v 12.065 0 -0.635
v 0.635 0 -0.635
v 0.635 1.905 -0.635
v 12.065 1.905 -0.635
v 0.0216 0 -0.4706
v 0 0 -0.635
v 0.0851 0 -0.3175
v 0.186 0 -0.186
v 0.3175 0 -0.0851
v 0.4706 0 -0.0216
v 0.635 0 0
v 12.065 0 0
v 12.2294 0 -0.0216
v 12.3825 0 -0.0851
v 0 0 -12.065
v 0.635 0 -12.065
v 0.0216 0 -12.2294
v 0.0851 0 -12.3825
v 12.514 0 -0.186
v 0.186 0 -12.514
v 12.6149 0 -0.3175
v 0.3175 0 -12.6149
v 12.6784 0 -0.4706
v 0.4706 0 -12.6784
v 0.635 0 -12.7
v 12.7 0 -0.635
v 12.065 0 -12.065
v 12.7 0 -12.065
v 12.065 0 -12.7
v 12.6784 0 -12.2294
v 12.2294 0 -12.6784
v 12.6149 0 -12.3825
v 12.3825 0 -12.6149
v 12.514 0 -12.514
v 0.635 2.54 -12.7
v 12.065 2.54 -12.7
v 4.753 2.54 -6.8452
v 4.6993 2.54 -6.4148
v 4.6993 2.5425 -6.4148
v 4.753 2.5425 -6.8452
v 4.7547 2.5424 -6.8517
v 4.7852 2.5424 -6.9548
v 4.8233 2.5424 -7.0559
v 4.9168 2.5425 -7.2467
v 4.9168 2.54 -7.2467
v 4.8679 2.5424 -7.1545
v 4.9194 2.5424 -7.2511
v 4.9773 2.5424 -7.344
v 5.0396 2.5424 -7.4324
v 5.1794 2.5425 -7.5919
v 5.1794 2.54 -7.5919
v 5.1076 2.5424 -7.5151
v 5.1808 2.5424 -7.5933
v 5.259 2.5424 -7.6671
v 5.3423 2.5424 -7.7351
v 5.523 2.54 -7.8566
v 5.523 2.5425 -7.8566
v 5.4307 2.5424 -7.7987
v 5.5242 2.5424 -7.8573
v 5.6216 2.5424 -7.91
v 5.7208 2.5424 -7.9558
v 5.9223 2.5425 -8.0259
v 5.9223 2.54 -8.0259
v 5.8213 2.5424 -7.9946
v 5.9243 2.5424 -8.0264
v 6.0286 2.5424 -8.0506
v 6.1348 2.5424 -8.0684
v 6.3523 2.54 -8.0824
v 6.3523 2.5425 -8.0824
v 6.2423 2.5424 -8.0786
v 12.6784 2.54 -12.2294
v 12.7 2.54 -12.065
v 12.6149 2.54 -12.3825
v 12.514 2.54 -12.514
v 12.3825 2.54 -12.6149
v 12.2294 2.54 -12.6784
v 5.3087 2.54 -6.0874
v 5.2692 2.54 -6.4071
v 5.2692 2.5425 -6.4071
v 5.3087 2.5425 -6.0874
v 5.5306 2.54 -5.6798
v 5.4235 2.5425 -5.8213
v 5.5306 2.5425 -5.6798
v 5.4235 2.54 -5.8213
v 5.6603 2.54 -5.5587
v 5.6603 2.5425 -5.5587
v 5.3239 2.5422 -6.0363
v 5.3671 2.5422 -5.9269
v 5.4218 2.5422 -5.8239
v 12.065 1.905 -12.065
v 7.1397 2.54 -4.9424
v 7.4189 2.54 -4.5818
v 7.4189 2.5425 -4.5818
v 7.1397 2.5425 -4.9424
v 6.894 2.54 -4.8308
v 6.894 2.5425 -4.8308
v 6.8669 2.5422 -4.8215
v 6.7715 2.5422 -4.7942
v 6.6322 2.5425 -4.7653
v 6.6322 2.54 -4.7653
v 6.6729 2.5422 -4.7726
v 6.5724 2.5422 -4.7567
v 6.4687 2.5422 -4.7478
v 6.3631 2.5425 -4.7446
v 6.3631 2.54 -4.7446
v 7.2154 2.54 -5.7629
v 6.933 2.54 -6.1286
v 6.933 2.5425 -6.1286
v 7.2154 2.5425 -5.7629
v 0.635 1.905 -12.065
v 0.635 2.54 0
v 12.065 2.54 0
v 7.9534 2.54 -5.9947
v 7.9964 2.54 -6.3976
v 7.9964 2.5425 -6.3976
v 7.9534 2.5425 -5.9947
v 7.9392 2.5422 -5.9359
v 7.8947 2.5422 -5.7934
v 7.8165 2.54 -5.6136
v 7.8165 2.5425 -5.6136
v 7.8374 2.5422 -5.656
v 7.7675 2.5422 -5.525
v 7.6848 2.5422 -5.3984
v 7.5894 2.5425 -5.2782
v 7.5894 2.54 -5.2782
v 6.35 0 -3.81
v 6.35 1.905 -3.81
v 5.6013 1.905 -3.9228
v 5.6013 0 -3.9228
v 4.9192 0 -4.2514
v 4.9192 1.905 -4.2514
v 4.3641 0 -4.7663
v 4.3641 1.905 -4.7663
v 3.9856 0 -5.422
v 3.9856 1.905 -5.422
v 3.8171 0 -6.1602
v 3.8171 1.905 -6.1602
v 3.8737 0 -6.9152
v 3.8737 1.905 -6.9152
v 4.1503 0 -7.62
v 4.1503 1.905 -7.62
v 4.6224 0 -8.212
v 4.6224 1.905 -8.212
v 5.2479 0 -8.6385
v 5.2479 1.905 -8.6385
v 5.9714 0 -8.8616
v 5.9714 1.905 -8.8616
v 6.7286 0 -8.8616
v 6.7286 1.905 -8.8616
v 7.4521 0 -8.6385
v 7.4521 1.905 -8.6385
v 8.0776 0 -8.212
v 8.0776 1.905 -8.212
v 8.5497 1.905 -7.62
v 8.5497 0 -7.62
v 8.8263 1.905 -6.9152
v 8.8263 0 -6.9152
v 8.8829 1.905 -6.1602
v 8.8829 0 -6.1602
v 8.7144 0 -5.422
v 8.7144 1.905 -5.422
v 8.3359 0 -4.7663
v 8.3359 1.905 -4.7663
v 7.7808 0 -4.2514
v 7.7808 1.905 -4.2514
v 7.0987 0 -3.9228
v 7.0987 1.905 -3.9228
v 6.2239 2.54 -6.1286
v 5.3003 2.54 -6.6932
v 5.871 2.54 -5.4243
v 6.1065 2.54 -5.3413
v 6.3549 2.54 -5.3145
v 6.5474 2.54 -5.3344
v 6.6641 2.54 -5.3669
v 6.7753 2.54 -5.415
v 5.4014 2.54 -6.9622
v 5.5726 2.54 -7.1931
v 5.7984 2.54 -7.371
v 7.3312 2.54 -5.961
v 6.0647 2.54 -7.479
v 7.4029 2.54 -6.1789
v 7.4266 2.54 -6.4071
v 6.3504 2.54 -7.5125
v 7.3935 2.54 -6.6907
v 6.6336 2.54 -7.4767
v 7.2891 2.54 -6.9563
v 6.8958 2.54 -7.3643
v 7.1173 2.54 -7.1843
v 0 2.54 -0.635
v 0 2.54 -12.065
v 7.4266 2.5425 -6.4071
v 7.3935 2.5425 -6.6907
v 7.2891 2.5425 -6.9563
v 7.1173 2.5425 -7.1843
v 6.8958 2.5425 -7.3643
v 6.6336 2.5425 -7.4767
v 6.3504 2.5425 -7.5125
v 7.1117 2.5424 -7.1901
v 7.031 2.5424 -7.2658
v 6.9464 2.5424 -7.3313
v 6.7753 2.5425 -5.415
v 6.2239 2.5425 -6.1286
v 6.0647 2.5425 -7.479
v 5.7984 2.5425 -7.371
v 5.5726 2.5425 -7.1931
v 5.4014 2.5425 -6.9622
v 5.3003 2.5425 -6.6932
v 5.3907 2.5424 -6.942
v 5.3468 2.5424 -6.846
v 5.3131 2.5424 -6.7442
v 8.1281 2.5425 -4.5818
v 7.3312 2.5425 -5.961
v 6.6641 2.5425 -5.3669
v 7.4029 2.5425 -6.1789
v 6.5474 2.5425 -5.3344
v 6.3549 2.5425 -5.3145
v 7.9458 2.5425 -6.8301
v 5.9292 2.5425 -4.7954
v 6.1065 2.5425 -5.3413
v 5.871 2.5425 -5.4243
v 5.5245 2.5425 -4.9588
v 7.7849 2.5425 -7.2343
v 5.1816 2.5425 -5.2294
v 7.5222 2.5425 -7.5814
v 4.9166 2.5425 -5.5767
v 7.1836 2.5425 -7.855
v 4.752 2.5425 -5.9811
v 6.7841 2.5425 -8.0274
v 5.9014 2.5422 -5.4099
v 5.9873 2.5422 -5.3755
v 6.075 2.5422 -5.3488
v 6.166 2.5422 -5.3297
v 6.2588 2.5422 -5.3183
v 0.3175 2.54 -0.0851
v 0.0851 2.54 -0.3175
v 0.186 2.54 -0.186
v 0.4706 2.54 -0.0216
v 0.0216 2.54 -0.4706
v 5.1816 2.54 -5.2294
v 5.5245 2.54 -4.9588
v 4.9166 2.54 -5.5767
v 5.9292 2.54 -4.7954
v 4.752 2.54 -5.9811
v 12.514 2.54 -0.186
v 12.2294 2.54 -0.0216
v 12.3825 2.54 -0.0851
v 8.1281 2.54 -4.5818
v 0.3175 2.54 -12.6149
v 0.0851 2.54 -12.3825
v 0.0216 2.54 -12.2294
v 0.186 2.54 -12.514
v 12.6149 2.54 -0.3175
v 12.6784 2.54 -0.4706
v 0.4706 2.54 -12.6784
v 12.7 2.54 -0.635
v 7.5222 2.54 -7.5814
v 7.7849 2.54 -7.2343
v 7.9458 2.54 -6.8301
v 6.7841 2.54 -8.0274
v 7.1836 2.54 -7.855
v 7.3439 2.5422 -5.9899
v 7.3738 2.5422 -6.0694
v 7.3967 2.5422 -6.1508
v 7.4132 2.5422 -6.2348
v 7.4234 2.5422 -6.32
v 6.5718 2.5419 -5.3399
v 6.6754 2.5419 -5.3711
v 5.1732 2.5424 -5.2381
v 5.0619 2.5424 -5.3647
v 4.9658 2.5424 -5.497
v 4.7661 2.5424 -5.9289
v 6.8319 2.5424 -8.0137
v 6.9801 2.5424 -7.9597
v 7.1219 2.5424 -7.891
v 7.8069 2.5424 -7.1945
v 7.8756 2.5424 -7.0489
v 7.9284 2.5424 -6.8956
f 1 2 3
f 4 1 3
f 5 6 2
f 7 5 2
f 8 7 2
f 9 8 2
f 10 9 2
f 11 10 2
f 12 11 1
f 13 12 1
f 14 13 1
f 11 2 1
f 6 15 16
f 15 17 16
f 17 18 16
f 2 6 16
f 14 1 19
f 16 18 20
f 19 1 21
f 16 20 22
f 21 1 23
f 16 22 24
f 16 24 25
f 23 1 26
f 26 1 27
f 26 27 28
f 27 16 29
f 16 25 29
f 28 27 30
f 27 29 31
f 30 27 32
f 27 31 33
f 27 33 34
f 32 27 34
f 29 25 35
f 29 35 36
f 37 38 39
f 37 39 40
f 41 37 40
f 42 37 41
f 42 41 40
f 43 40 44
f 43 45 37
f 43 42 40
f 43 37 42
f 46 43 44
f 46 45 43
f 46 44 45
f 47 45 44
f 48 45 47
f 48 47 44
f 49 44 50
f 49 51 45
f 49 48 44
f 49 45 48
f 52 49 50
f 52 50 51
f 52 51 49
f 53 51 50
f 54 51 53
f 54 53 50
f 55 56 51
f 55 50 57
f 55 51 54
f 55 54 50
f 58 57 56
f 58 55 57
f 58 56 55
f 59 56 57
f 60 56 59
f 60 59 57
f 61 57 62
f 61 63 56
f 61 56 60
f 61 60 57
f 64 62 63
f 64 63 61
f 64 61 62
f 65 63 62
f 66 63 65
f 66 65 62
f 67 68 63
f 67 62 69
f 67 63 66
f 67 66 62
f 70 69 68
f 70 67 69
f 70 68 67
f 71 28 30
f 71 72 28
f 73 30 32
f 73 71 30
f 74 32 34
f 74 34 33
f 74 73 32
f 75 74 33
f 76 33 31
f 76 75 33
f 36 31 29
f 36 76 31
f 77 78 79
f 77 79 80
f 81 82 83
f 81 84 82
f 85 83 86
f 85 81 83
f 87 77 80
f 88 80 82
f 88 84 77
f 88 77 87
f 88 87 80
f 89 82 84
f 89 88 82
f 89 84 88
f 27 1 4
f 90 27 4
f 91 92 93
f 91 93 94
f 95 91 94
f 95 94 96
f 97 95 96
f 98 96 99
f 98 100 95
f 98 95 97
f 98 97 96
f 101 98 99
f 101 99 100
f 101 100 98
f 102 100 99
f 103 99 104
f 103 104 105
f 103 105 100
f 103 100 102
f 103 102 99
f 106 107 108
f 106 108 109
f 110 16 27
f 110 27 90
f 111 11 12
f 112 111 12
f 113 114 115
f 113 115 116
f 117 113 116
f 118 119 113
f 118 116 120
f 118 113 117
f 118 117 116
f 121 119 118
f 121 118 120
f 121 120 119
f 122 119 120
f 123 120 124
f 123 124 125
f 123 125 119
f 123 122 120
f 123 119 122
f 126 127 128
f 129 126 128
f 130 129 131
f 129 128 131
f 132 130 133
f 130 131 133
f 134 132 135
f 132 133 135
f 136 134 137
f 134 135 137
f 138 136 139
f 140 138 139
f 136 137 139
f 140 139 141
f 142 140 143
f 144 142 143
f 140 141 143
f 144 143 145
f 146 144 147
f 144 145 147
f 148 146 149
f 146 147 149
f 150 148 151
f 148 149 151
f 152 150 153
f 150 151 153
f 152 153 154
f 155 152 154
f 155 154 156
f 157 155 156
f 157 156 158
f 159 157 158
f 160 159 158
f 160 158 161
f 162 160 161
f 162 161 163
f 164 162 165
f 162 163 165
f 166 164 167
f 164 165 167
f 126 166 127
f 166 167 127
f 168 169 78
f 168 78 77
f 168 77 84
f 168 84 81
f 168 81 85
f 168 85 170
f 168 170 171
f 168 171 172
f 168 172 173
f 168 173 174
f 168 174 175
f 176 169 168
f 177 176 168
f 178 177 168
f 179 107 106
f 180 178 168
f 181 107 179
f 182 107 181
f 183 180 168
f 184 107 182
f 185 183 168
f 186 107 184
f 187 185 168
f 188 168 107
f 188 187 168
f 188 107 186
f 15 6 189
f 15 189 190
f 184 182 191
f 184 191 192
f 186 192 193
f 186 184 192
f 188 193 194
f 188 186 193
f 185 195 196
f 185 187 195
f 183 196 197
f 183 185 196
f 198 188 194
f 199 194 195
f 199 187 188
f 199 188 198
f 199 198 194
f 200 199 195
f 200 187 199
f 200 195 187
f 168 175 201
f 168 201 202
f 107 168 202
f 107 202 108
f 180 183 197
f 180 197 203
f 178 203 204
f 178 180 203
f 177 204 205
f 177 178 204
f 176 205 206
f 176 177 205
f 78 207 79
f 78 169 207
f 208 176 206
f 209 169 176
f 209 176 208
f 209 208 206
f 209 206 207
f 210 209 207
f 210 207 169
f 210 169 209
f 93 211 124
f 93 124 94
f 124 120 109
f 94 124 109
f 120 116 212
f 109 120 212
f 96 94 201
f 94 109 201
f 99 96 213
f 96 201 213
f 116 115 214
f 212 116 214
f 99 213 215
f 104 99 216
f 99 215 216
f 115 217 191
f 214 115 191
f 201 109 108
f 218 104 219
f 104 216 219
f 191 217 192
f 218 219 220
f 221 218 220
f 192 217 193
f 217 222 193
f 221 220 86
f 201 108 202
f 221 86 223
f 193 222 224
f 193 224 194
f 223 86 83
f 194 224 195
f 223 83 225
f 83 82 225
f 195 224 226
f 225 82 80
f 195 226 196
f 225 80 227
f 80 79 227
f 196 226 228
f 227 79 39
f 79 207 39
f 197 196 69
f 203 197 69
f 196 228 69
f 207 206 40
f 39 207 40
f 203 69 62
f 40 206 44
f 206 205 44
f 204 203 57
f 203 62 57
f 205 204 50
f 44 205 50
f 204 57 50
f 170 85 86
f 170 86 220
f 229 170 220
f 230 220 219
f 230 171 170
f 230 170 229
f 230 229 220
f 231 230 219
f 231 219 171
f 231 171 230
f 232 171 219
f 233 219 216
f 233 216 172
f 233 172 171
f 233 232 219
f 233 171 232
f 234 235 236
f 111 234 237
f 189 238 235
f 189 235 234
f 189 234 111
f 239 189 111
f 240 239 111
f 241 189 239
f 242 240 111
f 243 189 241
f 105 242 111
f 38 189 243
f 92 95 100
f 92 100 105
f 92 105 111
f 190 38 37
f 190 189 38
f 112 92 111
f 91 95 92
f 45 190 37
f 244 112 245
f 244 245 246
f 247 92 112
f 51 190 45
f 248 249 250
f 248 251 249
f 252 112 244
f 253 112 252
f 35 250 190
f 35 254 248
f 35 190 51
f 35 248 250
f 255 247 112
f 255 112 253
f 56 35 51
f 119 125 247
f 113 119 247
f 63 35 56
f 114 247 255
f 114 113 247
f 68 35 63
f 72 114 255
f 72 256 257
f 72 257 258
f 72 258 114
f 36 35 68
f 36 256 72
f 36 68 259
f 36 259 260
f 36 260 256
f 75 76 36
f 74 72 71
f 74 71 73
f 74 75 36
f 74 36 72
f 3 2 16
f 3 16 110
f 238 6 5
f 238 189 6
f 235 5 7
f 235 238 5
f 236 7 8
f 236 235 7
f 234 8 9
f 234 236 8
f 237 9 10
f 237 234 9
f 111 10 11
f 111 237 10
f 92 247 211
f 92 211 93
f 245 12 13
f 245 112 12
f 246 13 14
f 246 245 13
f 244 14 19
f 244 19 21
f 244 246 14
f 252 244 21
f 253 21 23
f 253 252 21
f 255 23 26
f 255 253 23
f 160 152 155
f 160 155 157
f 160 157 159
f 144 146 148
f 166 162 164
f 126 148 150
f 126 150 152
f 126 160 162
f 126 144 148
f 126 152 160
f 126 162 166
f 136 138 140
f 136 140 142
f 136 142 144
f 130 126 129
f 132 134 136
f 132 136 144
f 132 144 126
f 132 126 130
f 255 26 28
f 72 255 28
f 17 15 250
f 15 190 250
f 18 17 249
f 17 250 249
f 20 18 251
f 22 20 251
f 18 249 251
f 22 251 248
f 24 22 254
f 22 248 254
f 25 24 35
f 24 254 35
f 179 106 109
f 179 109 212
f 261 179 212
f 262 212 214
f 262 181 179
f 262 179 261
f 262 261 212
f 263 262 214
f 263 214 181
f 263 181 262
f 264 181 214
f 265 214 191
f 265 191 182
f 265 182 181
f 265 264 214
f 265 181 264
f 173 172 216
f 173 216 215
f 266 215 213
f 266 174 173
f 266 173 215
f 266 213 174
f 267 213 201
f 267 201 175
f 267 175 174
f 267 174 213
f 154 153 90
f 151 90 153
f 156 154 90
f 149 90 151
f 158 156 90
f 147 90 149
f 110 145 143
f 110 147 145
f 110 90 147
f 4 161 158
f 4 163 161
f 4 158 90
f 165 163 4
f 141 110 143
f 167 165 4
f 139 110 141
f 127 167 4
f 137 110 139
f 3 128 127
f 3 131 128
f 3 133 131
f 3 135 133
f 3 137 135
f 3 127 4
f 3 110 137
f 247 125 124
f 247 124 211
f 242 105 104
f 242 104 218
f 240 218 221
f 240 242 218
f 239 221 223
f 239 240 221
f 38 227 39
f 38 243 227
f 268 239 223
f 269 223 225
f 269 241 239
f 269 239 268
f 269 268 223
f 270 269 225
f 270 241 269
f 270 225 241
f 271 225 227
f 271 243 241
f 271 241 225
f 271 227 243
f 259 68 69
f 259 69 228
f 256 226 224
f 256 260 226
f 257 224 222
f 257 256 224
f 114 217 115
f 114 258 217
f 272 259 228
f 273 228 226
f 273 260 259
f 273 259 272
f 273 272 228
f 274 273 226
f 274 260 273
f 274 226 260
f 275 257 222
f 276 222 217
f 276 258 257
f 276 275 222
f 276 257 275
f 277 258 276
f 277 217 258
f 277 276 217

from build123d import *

# Parameters (mm, degrees)
SKETCH1_W           = 12.7
SKETCH1_H           = 12.7
BOSS_EXTRUDE1_DEPTH = 2.54
FILLET1_R           = 0.635
SHELL1_START        = 0.635
SHELL1_OUTLINE_W    = 1.905
SHELL1_OUTLINE_H    = 11.43
SHELL1_DEPTH        = 11.43
SKETCH2_R           = 2.54
BOSS_EXTRUDE2_DEPTH = 1.905
BOSS_EXTRUDE3_DEPTH = 0.00254


# Read off the part's stored shape, not the designer's step: Shell1
with BuildPart() as part:
    # Sketch1 → Boss-Extrude1 (new body)
    with BuildSketch(Plane(origin=(0, 0, 0), x_dir=(1, 0, 0), z_dir=(0, 1, 0))):
        with Locations((6.35, 6.35)):
            Rectangle(SKETCH1_W, SKETCH1_H)
    extrude(amount=BOSS_EXTRUDE1_DEPTH)

    # Fillet1
    fillet1_edges = [part.edges().sort_by_distance(p)[0] for p in [
        (0, 1.27, -12.7),
        (12.7, 1.27, -12.7),
        (12.7, 1.27, 0),
        (0, 1.27, 0),
    ]]
    fillet(fillet1_edges, radius=FILLET1_R)

    # Shell1 outline → Shell1 (cut)
    with BuildSketch(Plane.YZ.offset(SHELL1_START)):
        with Locations((0.9525, -6.35)):
            Rectangle(SHELL1_OUTLINE_W, SHELL1_OUTLINE_H)
    extrude(amount=SHELL1_DEPTH, mode=Mode.SUBTRACT)

    # Sketch2 → Boss-Extrude2 (add)
    with BuildSketch(Plane(origin=(0, 1.905, 0), x_dir=(-1, 0, 0), z_dir=(0, -1, 0))):
        with Locations(Location((-6.35, 6.35, 0), (0, 0, 270))):
            Circle(SKETCH2_R)
    extrude(amount=BOSS_EXTRUDE2_DEPTH)

    # Sketch3 → Boss-Extrude3 (add)
    with BuildSketch(Plane(origin=(0, 2.54, 0), x_dir=(1, 0, 0), z_dir=(0, 1, 0))):
        with BuildLine():
            Line((7.589389744, 5.278208534), (8.128096675, 4.581769231))
            Line((8.128096675, 4.581769231), (7.418937019, 4.581769231))
            Line((7.418937019, 4.581769231), (7.13972528, 4.942391226))
            add(Edge.make_bspline(
                [(7.13972528, 4.942391226), (7.110478697, 4.926466187), (7.052123488, 4.894691228), (6.960614822, 4.855068108), (6.867412166, 4.820307815), (6.771164987, 4.793069664), (6.672797341, 4.771629932), (6.571799543, 4.755260346), (6.468243861, 4.746629027), (6.398354698, 4.745272899), (6.363147756, 4.744589744)],
                knots=[0, 0, 0, 0, 0.985706899, 1.966764212, 2.949968678, 3.929638882, 4.925906056, 5.930211904, 6.957336097, 8, 8, 8, 8], degree=3))
            add(Edge.make_bspline(
                [(6.363147756, 4.744589744), (6.304542849, 4.745905131), (6.189596707, 4.748485098), (6.021255045, 4.773257837), (5.86010189, 4.81065794), (5.706735433, 4.865301405), (5.560639002, 4.93474107), (5.422980515, 5.020794933), (5.292158769, 5.121077116), (5.171374474, 5.236571809), (5.060858729, 5.361731796), (4.96429439, 5.49470483), (4.88220836, 5.633416247), (4.815264882, 5.778083639), (4.763209523, 5.928956411), (4.726755567, 6.085622481), (4.703644343, 6.248298361), (4.700779646, 6.358724268), (4.699325641, 6.414772035)],
                knots=[0, 0, 0, 0, 1.070144486, 2.098953612, 3.10240755, 4.088674545, 5.067611437, 6.052256776, 7.0494179, 8.074208254, 9.100739571, 10.09639475, 11.072322686, 12.041159829, 13.004031207, 13.983083054, 14.976293755, 16, 16, 16, 16], degree=3))
            add(Edge.make_bspline(
                [(4.699325641, 6.414772035), (4.69981035, 6.452327381), (4.700773631, 6.526962536), (4.712359176, 6.637570612), (4.729074707, 6.74600964), (4.753617357, 6.851696745), (4.783880127, 6.95540729), (4.822385353, 7.056316673), (4.867009306, 7.15538311), (4.918202859, 7.251783598), (4.976351833, 7.344092805), (5.03814397, 7.433044208), (5.106877934, 7.51578176), (5.18012093, 7.594168735), (5.258113534, 7.668153791), (5.342084012, 7.736211938), (5.430436693, 7.800032133), (5.523808175, 7.858276403), (5.6205775, 7.910923569), (5.719854021, 7.956677527), (5.820882117, 7.995819583), (5.923699482, 8.027705354), (6.028618864, 8.051600525), (6.134717058, 8.0697941), (6.242956128, 8.079914479), (6.315639078, 8.081572932), (6.352335457, 8.082410256)],
                knots=[0, 0, 0, 0, 1.035855852, 2.058595393, 3.065553363, 4.06176554, 5.050183643, 6.044349766, 7.039272903, 8.046842428, 9.053256483, 10.04817962, 11.033146707, 12.018200652, 13.007259073, 13.996749908, 14.99846043, 16.012935138, 17.03119782, 18.036301871, 19.027088812, 20.018894167, 21.003704893, 21.994284571, 22.987348552, 24, 24, 24, 24], degree=3))
            add(Edge.make_bspline(
                [(6.352335457, 8.082410256), (6.407752886, 8.081001093), (6.516953024, 8.078224334), (6.677585719, 8.054480547), (6.832490656, 8.016657267), (6.981029087, 7.962010037), (7.12410888, 7.893107178), (7.260304055, 7.807850891), (7.391055808, 7.707999288), (7.513539447, 7.593504419), (7.626732359, 7.469249914), (7.725409869, 7.33593868), (7.808946318, 7.196116061), (7.878612035, 7.049726313), (7.931097461, 6.895913898), (7.968565757, 6.735700032), (7.992282098, 6.568971999), (7.995039629, 6.455345392), (7.996441026, 6.397599559)],
                knots=[0, 0, 0, 0, 1.015551519, 2.00114601, 2.970254478, 3.93428303, 4.897362978, 5.876714212, 6.874912676, 7.909046156, 8.946527051, 9.952474942, 10.9443724, 11.928494229, 12.919233427, 13.917651329, 14.941735923, 16, 16, 16, 16], degree=3))
            add(Edge.make_bspline(
                [(7.996441026, 6.397599559), (7.995275963, 6.344324576), (7.992984514, 6.239543185), (7.973133051, 6.085073676), (7.941799009, 5.93618576), (7.89679568, 5.792773627), (7.839764108, 5.654993593), (7.768702598, 5.523255836), (7.686759711, 5.39599636), (7.622008209, 5.317666883), (7.589389744, 5.278208534)],
                knots=[0, 0, 0, 0, 1.049646143, 2.064447078, 3.064298101, 4.044929938, 5.022708814, 5.998521441, 6.991758374, 8, 8, 8, 8], degree=3))
        make_face()
        with BuildLine():
            add(Edge.make_bspline(
                [(7.215411378, 5.762853966), (7.232374671, 5.787174078), (7.265910436, 5.835253985), (7.308344006, 5.911515257), (7.344794922, 5.989262448), (7.374938402, 6.068903528), (7.397868514, 6.150894907), (7.414166719, 6.234701319), (7.424959684, 6.320361144), (7.42602991, 6.378062342), (7.426569231, 6.407139824)],
                knots=[0, 0, 0, 0, 1.031533623, 2.039301536, 3.033003023, 4.018477747, 4.999688364, 5.992485227, 6.988348989, 8, 8, 8, 8], degree=3))
            add(Edge.make_bspline(
                [(7.426569231, 6.407139824), (7.425565467, 6.44492283), (7.423589712, 6.519292914), (7.408750209, 6.628618034), (7.383890189, 6.733390986), (7.349226622, 6.833868214), (7.305573348, 6.930307641), (7.250735612, 7.021906242), (7.186308475, 7.109139766), (7.112913869, 7.191168117), (7.03300641, 7.266242217), (6.948022887, 7.332360438), (6.858546258, 7.388140444), (6.764524178, 7.433179158), (6.666976563, 7.469454645), (6.564856578, 7.493802938), (6.459054311, 7.50976733), (6.386951725, 7.511606706), (6.350427404, 7.512538462)],
                knots=[0, 0, 0, 0, 1.056263418, 2.079093448, 3.078410197, 4.062632158, 5.04680056, 6.032966551, 7.041959893, 8.074807684, 9.106532056, 10.103754224, 11.080880922, 12.048629763, 13.014470275, 13.984975, 14.979267944, 16, 16, 16, 16], degree=3))
            add(Edge.make_bspline(
                [(6.350427404, 7.512538462), (6.312851373, 7.511555352), (6.238893703, 7.509620382), (6.130317465, 7.494494694), (6.026169919, 7.470769489), (5.926998511, 7.435934883), (5.832502968, 7.392042518), (5.742687623, 7.338185734), (5.658002596, 7.274062961), (5.578246545, 7.201552409), (5.506184165, 7.121091877), (5.442548821, 7.034811209), (5.38928769, 6.942918458), (5.344683443, 6.846250439), (5.311105764, 6.743724644), (5.287189539, 6.636142959), (5.272075339, 6.523320349), (5.270170179, 6.446409309), (5.269197436, 6.407139824)],
                knots=[0, 0, 0, 0, 1.042613217, 2.052085894, 3.036973397, 4.002832266, 4.963730975, 5.924467509, 6.903642813, 7.907474205, 8.911719447, 9.896835452, 10.877830278, 11.85475743, 12.846581833, 13.865885605, 14.910357018, 16, 16, 16, 16], degree=3))
            add(Edge.make_bspline(
                [(5.269197436, 6.407139824), (5.270486861, 6.363620201), (5.273013922, 6.278328951), (5.290802543, 6.153911765), (5.321215888, 6.036399284), (5.365204909, 5.926425933), (5.419563509, 5.822443324), (5.488046054, 5.726666097), (5.567678666, 5.637200516), (5.629149275, 5.585123602), (5.660348277, 5.558692308)],
                knots=[0, 0, 0, 0, 1.078047314, 2.112794111, 3.106520711, 4.077995885, 5.041371964, 6.006121678, 6.988020189, 8, 8, 8, 8], degree=3))
            add(Edge.make_bspline(
                [(5.660348277, 5.558692308), (5.685874998, 5.539126434), (5.73649664, 5.500325655), (5.817588059, 5.451211693), (5.900701996, 5.408546176), (5.986624335, 5.374435559), (6.075058256, 5.347307518), (6.165984953, 5.328515818), (6.259582038, 5.316554097), (6.32282995, 5.315165288), (6.354879527, 5.314461538)],
                knots=[0, 0, 0, 0, 1.027457745, 2.037535419, 3.025615023, 4.011018129, 4.9886297, 5.978868484, 6.975833209, 8, 8, 8, 8], degree=3))
            add(Edge.make_bspline(
                [(6.354879527, 5.314461538), (6.391651355, 5.315632394), (6.464636665, 5.317956327), (6.57206456, 5.338199851), (6.676734184, 5.368474506), (6.742353753, 5.399420844), (6.775287179, 5.414952324)],
                knots=[0, 0, 0, 0, 1.010952568, 2.006554787, 2.999521277, 4, 4, 4, 4], degree=3))
            Line((6.775287179, 5.414952324), (6.223859896, 6.128564103))
            Line((6.223859896, 6.128564103), (6.933019551, 6.128564103))
            Line((6.933019551, 6.128564103), (7.215411378, 5.762853966))
        make_face(mode=Mode.SUBTRACT)
    extrude(amount=BOSS_EXTRUDE3_DEPTH)


solid = part.part
